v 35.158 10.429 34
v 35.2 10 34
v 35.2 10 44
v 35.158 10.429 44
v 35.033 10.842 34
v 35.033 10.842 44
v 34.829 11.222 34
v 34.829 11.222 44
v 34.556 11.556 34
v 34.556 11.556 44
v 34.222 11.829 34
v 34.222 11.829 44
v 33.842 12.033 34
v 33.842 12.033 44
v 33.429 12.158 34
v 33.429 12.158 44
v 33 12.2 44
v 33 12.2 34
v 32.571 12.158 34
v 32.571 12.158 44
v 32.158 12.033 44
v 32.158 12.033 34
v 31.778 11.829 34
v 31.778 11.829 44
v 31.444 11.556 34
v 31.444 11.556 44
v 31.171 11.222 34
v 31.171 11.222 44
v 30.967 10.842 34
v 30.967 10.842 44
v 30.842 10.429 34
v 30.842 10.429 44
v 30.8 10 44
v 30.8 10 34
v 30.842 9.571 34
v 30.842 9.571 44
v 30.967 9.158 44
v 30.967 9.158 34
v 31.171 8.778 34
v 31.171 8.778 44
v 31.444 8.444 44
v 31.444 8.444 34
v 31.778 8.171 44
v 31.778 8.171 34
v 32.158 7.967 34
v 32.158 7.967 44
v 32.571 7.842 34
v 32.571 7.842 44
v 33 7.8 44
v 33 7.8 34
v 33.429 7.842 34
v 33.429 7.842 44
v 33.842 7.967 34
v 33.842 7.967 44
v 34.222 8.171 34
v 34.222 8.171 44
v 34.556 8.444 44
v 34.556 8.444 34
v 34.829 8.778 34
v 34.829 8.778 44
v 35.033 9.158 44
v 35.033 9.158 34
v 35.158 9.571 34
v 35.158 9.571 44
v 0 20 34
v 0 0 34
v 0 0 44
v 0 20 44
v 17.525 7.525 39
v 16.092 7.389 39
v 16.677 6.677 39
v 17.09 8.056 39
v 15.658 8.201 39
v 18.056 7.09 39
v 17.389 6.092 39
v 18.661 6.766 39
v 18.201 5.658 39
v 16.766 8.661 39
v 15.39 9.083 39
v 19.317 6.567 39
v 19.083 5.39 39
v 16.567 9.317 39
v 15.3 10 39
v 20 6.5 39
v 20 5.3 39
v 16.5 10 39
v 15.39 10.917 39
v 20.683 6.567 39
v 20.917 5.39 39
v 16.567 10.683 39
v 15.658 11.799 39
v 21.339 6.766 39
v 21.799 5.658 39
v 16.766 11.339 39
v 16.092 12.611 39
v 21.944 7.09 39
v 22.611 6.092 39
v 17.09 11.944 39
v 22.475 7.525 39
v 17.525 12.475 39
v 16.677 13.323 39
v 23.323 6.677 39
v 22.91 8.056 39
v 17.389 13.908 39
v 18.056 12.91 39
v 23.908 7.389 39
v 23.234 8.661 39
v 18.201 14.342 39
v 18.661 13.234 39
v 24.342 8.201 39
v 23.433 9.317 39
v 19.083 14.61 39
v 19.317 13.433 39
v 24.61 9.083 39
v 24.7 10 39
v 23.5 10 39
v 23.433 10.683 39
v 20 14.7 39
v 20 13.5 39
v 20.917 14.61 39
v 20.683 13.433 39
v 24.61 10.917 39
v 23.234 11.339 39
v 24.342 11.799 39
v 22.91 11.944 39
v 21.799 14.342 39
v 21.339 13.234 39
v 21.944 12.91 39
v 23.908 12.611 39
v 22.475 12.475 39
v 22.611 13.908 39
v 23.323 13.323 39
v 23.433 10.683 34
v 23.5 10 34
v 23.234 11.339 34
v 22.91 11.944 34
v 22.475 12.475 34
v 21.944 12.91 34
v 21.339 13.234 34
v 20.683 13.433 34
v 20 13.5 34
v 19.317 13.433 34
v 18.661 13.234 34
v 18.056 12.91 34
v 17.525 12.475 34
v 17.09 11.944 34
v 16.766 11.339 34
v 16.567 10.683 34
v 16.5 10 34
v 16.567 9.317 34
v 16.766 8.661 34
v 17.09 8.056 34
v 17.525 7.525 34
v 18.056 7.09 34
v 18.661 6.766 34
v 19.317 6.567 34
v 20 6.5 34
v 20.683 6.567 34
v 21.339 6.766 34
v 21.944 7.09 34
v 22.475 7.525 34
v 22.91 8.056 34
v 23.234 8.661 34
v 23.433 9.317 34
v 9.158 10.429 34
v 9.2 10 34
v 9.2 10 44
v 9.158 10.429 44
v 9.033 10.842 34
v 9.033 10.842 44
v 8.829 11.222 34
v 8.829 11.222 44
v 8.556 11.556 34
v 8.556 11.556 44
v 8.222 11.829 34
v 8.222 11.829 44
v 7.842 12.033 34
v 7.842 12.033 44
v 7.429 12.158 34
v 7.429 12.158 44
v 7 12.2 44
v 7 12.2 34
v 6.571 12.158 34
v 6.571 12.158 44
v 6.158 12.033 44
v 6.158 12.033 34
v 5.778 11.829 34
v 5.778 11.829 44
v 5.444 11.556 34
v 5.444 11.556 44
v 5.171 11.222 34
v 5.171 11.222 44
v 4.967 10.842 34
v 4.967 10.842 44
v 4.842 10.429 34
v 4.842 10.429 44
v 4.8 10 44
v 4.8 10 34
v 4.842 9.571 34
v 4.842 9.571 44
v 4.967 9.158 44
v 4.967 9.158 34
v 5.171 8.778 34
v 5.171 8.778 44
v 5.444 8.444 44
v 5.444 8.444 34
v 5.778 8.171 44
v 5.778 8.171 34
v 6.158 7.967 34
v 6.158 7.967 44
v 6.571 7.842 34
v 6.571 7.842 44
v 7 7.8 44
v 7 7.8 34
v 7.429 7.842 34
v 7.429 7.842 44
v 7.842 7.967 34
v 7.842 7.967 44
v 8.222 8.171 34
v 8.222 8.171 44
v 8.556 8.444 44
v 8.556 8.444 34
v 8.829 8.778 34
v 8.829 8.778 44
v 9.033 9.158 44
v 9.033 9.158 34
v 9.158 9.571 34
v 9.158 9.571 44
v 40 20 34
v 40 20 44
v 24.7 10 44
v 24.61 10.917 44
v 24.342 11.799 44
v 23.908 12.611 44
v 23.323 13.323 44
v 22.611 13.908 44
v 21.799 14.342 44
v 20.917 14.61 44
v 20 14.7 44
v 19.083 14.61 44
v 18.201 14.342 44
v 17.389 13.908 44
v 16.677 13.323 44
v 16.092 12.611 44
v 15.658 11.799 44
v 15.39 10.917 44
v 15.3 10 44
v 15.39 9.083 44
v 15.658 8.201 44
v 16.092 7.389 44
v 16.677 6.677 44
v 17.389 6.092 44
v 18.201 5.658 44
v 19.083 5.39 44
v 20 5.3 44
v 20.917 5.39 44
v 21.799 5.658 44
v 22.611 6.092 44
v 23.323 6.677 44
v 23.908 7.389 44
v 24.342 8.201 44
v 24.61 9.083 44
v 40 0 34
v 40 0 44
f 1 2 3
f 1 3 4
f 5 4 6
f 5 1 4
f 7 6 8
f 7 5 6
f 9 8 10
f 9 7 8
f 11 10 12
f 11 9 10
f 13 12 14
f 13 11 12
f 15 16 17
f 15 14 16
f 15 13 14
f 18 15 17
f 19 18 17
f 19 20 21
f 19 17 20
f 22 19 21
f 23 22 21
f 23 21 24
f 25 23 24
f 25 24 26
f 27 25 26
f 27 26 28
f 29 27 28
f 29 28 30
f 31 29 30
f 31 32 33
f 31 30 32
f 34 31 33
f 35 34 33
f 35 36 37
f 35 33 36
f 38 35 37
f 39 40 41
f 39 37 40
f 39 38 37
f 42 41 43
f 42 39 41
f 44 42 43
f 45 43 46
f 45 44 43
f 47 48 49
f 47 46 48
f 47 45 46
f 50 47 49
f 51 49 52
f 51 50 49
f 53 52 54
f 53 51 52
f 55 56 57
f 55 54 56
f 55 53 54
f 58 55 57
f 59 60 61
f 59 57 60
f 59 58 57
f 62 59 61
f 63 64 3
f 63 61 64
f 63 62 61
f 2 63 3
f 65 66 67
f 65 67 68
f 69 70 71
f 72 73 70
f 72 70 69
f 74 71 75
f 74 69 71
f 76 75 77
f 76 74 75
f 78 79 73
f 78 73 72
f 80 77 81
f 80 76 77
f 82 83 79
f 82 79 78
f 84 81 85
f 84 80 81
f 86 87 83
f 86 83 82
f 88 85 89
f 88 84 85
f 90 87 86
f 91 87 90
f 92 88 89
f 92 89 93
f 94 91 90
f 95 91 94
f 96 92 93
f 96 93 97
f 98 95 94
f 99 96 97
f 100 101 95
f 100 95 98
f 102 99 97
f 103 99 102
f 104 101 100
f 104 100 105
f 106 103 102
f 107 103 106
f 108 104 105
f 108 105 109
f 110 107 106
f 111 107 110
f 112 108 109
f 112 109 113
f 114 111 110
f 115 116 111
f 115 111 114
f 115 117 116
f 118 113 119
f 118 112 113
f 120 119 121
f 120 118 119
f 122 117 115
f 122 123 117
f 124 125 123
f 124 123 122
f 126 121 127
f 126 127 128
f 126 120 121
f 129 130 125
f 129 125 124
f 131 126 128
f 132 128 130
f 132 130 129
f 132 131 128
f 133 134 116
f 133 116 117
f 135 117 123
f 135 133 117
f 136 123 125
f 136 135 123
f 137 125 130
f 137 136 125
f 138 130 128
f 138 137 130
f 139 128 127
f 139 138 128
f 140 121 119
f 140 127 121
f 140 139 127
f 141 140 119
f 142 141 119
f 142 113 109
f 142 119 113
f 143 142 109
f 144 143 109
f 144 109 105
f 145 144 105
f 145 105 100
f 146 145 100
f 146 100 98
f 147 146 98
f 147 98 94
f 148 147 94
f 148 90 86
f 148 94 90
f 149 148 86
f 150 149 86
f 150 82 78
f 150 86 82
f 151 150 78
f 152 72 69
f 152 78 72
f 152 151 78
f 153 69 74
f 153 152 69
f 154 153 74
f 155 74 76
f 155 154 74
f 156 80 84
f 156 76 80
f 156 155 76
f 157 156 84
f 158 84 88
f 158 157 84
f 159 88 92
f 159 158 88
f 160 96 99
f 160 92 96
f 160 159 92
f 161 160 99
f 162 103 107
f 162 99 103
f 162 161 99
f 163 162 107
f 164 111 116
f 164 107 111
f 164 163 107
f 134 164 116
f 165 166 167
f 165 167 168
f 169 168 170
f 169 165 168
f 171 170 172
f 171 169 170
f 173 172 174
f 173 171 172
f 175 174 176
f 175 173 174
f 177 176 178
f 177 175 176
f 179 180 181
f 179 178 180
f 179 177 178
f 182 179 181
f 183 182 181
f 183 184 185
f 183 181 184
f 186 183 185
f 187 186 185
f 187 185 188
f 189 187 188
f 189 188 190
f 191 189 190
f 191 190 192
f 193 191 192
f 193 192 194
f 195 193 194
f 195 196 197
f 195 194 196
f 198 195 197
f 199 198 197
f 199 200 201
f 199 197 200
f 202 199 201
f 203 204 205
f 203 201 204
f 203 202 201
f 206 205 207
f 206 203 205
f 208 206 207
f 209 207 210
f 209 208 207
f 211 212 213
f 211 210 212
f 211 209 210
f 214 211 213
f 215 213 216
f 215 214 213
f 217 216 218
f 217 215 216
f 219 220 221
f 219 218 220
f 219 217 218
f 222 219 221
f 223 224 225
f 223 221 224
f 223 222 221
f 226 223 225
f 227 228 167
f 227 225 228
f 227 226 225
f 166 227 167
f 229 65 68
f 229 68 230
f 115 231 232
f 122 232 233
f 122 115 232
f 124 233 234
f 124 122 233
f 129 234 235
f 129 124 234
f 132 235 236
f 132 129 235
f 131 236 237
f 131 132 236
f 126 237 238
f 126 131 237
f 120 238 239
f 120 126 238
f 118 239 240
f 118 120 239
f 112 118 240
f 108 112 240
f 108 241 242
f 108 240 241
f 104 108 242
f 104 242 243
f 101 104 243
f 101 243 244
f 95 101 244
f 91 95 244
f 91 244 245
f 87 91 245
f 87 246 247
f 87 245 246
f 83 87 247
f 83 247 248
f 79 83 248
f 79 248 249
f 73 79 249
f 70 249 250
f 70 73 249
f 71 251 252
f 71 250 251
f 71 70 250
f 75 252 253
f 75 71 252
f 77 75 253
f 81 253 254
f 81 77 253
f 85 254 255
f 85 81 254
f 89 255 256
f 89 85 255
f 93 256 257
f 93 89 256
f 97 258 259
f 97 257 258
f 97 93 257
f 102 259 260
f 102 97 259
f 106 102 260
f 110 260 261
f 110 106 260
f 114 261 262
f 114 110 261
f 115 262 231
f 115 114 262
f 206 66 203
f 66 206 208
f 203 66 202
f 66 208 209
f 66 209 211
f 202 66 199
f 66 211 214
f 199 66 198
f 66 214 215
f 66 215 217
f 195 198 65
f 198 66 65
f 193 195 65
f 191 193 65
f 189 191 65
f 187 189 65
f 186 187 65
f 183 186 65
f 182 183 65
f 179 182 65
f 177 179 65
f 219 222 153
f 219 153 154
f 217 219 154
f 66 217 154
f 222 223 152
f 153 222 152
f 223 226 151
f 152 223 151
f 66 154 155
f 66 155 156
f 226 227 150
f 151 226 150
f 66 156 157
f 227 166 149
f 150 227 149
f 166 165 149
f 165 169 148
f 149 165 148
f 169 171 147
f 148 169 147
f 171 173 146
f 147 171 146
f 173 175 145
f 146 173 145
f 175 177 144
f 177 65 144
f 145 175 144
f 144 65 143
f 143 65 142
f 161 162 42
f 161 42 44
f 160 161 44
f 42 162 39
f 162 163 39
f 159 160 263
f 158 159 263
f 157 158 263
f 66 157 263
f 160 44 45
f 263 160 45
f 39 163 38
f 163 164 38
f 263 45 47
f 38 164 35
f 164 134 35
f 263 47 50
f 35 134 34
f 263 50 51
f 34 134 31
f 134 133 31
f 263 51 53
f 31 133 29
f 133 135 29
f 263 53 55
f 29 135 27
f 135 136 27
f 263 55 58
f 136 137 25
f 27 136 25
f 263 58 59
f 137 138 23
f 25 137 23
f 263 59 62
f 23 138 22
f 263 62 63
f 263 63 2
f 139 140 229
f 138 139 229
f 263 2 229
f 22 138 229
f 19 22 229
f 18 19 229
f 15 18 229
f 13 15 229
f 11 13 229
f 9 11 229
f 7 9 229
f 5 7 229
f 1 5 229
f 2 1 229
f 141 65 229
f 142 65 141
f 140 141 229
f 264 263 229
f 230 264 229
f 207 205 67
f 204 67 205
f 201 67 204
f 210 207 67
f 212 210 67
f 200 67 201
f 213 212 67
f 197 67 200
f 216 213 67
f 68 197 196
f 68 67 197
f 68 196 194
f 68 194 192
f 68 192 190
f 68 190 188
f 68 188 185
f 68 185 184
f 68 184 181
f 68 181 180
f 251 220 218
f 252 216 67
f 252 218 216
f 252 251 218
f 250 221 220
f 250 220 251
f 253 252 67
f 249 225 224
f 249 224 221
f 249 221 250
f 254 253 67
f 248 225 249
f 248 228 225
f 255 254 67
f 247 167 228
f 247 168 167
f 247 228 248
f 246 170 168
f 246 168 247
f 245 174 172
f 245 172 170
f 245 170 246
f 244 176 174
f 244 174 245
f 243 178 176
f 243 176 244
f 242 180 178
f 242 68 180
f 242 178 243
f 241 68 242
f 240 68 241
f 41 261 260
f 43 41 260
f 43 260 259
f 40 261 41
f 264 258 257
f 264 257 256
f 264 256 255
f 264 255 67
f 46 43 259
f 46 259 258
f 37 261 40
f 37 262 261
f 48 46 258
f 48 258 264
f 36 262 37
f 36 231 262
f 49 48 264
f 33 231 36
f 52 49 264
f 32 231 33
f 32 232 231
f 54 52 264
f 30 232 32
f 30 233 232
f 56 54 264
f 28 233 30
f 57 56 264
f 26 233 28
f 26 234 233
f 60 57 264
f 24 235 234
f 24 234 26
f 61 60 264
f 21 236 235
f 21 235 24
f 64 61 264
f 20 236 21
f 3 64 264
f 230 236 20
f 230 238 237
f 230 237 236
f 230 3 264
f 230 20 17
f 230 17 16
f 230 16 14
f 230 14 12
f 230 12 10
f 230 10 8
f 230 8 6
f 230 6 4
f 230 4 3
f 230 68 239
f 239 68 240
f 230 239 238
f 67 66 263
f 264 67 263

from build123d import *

# Parameters (mm, degrees)
CYLINDER007_R     = 2.2
CYLINDER007_DEPTH = 15
CYLINDER006_R     = 2.2
CYLINDER006_DEPTH = 15
CYLINDER005_R     = 4.7
CYLINDER005_DEPTH = 15
CYLINDER004_R     = 3.5
CYLINDER004_DEPTH = 15
BOX001006_W       = 40
BOX001006_H       = 20
BOX001006_DEPTH   = 10


with BuildPart() as cylinder007:
    # Cylinder007 → Cylinder007 (new body)
    with BuildSketch(Plane(origin=(33, 10, -1), x_dir=(1, 0, 0), z_dir=(0, 0, 1))):
        Circle(CYLINDER007_R)
    extrude(amount=CYLINDER007_DEPTH)


with BuildPart() as fusion004:
    # Cylinder006 → Cylinder006 (new body)
    with BuildSketch(Plane(origin=(7, 10, -1), x_dir=(1, 0, 0), z_dir=(0, 0, 1))):
        Circle(CYLINDER006_R)
    extrude(amount=CYLINDER006_DEPTH)

    # Fusion004: union Cylinder007
    add(cylinder007.part)


with BuildPart() as cylinder005:
    # Cylinder005 → Cylinder005 (new body)
    with BuildSketch(Plane(origin=(20, 10, 5), x_dir=(1, 0, 0), z_dir=(0, 0, 1))):
        Circle(CYLINDER005_R)
    extrude(amount=CYLINDER005_DEPTH)


with BuildPart() as fusion003:
    # Cylinder004 → Cylinder004 (new body)
    with BuildSketch(Plane(origin=(20, 10, -1), x_dir=(1, 0, 0), z_dir=(0, 0, 1))):
        Circle(CYLINDER004_R)
    extrude(amount=CYLINDER004_DEPTH)

    # Fusion003: union Cylinder005
    add(cylinder005.part)


with BuildPart() as cut004:
    # Box001006 → Box001006 (new body)
    with BuildSketch(Plane.XY):
        with Locations((20, 10)):
            Rectangle(BOX001006_W, BOX001006_H)
    extrude(amount=BOX001006_DEPTH)

    # Cut003: cut Fusion003
    add(fusion003.part, mode=Mode.SUBTRACT)

    # Cut004: cut Fusion004
    add(fusion004.part, mode=Mode.SUBTRACT)


with BuildPart() as cut004_1:
    # Cut004 placement: moved
    add(cut004.part.moved(Location((0, 0, 34))))


solid = cut004_1.part
